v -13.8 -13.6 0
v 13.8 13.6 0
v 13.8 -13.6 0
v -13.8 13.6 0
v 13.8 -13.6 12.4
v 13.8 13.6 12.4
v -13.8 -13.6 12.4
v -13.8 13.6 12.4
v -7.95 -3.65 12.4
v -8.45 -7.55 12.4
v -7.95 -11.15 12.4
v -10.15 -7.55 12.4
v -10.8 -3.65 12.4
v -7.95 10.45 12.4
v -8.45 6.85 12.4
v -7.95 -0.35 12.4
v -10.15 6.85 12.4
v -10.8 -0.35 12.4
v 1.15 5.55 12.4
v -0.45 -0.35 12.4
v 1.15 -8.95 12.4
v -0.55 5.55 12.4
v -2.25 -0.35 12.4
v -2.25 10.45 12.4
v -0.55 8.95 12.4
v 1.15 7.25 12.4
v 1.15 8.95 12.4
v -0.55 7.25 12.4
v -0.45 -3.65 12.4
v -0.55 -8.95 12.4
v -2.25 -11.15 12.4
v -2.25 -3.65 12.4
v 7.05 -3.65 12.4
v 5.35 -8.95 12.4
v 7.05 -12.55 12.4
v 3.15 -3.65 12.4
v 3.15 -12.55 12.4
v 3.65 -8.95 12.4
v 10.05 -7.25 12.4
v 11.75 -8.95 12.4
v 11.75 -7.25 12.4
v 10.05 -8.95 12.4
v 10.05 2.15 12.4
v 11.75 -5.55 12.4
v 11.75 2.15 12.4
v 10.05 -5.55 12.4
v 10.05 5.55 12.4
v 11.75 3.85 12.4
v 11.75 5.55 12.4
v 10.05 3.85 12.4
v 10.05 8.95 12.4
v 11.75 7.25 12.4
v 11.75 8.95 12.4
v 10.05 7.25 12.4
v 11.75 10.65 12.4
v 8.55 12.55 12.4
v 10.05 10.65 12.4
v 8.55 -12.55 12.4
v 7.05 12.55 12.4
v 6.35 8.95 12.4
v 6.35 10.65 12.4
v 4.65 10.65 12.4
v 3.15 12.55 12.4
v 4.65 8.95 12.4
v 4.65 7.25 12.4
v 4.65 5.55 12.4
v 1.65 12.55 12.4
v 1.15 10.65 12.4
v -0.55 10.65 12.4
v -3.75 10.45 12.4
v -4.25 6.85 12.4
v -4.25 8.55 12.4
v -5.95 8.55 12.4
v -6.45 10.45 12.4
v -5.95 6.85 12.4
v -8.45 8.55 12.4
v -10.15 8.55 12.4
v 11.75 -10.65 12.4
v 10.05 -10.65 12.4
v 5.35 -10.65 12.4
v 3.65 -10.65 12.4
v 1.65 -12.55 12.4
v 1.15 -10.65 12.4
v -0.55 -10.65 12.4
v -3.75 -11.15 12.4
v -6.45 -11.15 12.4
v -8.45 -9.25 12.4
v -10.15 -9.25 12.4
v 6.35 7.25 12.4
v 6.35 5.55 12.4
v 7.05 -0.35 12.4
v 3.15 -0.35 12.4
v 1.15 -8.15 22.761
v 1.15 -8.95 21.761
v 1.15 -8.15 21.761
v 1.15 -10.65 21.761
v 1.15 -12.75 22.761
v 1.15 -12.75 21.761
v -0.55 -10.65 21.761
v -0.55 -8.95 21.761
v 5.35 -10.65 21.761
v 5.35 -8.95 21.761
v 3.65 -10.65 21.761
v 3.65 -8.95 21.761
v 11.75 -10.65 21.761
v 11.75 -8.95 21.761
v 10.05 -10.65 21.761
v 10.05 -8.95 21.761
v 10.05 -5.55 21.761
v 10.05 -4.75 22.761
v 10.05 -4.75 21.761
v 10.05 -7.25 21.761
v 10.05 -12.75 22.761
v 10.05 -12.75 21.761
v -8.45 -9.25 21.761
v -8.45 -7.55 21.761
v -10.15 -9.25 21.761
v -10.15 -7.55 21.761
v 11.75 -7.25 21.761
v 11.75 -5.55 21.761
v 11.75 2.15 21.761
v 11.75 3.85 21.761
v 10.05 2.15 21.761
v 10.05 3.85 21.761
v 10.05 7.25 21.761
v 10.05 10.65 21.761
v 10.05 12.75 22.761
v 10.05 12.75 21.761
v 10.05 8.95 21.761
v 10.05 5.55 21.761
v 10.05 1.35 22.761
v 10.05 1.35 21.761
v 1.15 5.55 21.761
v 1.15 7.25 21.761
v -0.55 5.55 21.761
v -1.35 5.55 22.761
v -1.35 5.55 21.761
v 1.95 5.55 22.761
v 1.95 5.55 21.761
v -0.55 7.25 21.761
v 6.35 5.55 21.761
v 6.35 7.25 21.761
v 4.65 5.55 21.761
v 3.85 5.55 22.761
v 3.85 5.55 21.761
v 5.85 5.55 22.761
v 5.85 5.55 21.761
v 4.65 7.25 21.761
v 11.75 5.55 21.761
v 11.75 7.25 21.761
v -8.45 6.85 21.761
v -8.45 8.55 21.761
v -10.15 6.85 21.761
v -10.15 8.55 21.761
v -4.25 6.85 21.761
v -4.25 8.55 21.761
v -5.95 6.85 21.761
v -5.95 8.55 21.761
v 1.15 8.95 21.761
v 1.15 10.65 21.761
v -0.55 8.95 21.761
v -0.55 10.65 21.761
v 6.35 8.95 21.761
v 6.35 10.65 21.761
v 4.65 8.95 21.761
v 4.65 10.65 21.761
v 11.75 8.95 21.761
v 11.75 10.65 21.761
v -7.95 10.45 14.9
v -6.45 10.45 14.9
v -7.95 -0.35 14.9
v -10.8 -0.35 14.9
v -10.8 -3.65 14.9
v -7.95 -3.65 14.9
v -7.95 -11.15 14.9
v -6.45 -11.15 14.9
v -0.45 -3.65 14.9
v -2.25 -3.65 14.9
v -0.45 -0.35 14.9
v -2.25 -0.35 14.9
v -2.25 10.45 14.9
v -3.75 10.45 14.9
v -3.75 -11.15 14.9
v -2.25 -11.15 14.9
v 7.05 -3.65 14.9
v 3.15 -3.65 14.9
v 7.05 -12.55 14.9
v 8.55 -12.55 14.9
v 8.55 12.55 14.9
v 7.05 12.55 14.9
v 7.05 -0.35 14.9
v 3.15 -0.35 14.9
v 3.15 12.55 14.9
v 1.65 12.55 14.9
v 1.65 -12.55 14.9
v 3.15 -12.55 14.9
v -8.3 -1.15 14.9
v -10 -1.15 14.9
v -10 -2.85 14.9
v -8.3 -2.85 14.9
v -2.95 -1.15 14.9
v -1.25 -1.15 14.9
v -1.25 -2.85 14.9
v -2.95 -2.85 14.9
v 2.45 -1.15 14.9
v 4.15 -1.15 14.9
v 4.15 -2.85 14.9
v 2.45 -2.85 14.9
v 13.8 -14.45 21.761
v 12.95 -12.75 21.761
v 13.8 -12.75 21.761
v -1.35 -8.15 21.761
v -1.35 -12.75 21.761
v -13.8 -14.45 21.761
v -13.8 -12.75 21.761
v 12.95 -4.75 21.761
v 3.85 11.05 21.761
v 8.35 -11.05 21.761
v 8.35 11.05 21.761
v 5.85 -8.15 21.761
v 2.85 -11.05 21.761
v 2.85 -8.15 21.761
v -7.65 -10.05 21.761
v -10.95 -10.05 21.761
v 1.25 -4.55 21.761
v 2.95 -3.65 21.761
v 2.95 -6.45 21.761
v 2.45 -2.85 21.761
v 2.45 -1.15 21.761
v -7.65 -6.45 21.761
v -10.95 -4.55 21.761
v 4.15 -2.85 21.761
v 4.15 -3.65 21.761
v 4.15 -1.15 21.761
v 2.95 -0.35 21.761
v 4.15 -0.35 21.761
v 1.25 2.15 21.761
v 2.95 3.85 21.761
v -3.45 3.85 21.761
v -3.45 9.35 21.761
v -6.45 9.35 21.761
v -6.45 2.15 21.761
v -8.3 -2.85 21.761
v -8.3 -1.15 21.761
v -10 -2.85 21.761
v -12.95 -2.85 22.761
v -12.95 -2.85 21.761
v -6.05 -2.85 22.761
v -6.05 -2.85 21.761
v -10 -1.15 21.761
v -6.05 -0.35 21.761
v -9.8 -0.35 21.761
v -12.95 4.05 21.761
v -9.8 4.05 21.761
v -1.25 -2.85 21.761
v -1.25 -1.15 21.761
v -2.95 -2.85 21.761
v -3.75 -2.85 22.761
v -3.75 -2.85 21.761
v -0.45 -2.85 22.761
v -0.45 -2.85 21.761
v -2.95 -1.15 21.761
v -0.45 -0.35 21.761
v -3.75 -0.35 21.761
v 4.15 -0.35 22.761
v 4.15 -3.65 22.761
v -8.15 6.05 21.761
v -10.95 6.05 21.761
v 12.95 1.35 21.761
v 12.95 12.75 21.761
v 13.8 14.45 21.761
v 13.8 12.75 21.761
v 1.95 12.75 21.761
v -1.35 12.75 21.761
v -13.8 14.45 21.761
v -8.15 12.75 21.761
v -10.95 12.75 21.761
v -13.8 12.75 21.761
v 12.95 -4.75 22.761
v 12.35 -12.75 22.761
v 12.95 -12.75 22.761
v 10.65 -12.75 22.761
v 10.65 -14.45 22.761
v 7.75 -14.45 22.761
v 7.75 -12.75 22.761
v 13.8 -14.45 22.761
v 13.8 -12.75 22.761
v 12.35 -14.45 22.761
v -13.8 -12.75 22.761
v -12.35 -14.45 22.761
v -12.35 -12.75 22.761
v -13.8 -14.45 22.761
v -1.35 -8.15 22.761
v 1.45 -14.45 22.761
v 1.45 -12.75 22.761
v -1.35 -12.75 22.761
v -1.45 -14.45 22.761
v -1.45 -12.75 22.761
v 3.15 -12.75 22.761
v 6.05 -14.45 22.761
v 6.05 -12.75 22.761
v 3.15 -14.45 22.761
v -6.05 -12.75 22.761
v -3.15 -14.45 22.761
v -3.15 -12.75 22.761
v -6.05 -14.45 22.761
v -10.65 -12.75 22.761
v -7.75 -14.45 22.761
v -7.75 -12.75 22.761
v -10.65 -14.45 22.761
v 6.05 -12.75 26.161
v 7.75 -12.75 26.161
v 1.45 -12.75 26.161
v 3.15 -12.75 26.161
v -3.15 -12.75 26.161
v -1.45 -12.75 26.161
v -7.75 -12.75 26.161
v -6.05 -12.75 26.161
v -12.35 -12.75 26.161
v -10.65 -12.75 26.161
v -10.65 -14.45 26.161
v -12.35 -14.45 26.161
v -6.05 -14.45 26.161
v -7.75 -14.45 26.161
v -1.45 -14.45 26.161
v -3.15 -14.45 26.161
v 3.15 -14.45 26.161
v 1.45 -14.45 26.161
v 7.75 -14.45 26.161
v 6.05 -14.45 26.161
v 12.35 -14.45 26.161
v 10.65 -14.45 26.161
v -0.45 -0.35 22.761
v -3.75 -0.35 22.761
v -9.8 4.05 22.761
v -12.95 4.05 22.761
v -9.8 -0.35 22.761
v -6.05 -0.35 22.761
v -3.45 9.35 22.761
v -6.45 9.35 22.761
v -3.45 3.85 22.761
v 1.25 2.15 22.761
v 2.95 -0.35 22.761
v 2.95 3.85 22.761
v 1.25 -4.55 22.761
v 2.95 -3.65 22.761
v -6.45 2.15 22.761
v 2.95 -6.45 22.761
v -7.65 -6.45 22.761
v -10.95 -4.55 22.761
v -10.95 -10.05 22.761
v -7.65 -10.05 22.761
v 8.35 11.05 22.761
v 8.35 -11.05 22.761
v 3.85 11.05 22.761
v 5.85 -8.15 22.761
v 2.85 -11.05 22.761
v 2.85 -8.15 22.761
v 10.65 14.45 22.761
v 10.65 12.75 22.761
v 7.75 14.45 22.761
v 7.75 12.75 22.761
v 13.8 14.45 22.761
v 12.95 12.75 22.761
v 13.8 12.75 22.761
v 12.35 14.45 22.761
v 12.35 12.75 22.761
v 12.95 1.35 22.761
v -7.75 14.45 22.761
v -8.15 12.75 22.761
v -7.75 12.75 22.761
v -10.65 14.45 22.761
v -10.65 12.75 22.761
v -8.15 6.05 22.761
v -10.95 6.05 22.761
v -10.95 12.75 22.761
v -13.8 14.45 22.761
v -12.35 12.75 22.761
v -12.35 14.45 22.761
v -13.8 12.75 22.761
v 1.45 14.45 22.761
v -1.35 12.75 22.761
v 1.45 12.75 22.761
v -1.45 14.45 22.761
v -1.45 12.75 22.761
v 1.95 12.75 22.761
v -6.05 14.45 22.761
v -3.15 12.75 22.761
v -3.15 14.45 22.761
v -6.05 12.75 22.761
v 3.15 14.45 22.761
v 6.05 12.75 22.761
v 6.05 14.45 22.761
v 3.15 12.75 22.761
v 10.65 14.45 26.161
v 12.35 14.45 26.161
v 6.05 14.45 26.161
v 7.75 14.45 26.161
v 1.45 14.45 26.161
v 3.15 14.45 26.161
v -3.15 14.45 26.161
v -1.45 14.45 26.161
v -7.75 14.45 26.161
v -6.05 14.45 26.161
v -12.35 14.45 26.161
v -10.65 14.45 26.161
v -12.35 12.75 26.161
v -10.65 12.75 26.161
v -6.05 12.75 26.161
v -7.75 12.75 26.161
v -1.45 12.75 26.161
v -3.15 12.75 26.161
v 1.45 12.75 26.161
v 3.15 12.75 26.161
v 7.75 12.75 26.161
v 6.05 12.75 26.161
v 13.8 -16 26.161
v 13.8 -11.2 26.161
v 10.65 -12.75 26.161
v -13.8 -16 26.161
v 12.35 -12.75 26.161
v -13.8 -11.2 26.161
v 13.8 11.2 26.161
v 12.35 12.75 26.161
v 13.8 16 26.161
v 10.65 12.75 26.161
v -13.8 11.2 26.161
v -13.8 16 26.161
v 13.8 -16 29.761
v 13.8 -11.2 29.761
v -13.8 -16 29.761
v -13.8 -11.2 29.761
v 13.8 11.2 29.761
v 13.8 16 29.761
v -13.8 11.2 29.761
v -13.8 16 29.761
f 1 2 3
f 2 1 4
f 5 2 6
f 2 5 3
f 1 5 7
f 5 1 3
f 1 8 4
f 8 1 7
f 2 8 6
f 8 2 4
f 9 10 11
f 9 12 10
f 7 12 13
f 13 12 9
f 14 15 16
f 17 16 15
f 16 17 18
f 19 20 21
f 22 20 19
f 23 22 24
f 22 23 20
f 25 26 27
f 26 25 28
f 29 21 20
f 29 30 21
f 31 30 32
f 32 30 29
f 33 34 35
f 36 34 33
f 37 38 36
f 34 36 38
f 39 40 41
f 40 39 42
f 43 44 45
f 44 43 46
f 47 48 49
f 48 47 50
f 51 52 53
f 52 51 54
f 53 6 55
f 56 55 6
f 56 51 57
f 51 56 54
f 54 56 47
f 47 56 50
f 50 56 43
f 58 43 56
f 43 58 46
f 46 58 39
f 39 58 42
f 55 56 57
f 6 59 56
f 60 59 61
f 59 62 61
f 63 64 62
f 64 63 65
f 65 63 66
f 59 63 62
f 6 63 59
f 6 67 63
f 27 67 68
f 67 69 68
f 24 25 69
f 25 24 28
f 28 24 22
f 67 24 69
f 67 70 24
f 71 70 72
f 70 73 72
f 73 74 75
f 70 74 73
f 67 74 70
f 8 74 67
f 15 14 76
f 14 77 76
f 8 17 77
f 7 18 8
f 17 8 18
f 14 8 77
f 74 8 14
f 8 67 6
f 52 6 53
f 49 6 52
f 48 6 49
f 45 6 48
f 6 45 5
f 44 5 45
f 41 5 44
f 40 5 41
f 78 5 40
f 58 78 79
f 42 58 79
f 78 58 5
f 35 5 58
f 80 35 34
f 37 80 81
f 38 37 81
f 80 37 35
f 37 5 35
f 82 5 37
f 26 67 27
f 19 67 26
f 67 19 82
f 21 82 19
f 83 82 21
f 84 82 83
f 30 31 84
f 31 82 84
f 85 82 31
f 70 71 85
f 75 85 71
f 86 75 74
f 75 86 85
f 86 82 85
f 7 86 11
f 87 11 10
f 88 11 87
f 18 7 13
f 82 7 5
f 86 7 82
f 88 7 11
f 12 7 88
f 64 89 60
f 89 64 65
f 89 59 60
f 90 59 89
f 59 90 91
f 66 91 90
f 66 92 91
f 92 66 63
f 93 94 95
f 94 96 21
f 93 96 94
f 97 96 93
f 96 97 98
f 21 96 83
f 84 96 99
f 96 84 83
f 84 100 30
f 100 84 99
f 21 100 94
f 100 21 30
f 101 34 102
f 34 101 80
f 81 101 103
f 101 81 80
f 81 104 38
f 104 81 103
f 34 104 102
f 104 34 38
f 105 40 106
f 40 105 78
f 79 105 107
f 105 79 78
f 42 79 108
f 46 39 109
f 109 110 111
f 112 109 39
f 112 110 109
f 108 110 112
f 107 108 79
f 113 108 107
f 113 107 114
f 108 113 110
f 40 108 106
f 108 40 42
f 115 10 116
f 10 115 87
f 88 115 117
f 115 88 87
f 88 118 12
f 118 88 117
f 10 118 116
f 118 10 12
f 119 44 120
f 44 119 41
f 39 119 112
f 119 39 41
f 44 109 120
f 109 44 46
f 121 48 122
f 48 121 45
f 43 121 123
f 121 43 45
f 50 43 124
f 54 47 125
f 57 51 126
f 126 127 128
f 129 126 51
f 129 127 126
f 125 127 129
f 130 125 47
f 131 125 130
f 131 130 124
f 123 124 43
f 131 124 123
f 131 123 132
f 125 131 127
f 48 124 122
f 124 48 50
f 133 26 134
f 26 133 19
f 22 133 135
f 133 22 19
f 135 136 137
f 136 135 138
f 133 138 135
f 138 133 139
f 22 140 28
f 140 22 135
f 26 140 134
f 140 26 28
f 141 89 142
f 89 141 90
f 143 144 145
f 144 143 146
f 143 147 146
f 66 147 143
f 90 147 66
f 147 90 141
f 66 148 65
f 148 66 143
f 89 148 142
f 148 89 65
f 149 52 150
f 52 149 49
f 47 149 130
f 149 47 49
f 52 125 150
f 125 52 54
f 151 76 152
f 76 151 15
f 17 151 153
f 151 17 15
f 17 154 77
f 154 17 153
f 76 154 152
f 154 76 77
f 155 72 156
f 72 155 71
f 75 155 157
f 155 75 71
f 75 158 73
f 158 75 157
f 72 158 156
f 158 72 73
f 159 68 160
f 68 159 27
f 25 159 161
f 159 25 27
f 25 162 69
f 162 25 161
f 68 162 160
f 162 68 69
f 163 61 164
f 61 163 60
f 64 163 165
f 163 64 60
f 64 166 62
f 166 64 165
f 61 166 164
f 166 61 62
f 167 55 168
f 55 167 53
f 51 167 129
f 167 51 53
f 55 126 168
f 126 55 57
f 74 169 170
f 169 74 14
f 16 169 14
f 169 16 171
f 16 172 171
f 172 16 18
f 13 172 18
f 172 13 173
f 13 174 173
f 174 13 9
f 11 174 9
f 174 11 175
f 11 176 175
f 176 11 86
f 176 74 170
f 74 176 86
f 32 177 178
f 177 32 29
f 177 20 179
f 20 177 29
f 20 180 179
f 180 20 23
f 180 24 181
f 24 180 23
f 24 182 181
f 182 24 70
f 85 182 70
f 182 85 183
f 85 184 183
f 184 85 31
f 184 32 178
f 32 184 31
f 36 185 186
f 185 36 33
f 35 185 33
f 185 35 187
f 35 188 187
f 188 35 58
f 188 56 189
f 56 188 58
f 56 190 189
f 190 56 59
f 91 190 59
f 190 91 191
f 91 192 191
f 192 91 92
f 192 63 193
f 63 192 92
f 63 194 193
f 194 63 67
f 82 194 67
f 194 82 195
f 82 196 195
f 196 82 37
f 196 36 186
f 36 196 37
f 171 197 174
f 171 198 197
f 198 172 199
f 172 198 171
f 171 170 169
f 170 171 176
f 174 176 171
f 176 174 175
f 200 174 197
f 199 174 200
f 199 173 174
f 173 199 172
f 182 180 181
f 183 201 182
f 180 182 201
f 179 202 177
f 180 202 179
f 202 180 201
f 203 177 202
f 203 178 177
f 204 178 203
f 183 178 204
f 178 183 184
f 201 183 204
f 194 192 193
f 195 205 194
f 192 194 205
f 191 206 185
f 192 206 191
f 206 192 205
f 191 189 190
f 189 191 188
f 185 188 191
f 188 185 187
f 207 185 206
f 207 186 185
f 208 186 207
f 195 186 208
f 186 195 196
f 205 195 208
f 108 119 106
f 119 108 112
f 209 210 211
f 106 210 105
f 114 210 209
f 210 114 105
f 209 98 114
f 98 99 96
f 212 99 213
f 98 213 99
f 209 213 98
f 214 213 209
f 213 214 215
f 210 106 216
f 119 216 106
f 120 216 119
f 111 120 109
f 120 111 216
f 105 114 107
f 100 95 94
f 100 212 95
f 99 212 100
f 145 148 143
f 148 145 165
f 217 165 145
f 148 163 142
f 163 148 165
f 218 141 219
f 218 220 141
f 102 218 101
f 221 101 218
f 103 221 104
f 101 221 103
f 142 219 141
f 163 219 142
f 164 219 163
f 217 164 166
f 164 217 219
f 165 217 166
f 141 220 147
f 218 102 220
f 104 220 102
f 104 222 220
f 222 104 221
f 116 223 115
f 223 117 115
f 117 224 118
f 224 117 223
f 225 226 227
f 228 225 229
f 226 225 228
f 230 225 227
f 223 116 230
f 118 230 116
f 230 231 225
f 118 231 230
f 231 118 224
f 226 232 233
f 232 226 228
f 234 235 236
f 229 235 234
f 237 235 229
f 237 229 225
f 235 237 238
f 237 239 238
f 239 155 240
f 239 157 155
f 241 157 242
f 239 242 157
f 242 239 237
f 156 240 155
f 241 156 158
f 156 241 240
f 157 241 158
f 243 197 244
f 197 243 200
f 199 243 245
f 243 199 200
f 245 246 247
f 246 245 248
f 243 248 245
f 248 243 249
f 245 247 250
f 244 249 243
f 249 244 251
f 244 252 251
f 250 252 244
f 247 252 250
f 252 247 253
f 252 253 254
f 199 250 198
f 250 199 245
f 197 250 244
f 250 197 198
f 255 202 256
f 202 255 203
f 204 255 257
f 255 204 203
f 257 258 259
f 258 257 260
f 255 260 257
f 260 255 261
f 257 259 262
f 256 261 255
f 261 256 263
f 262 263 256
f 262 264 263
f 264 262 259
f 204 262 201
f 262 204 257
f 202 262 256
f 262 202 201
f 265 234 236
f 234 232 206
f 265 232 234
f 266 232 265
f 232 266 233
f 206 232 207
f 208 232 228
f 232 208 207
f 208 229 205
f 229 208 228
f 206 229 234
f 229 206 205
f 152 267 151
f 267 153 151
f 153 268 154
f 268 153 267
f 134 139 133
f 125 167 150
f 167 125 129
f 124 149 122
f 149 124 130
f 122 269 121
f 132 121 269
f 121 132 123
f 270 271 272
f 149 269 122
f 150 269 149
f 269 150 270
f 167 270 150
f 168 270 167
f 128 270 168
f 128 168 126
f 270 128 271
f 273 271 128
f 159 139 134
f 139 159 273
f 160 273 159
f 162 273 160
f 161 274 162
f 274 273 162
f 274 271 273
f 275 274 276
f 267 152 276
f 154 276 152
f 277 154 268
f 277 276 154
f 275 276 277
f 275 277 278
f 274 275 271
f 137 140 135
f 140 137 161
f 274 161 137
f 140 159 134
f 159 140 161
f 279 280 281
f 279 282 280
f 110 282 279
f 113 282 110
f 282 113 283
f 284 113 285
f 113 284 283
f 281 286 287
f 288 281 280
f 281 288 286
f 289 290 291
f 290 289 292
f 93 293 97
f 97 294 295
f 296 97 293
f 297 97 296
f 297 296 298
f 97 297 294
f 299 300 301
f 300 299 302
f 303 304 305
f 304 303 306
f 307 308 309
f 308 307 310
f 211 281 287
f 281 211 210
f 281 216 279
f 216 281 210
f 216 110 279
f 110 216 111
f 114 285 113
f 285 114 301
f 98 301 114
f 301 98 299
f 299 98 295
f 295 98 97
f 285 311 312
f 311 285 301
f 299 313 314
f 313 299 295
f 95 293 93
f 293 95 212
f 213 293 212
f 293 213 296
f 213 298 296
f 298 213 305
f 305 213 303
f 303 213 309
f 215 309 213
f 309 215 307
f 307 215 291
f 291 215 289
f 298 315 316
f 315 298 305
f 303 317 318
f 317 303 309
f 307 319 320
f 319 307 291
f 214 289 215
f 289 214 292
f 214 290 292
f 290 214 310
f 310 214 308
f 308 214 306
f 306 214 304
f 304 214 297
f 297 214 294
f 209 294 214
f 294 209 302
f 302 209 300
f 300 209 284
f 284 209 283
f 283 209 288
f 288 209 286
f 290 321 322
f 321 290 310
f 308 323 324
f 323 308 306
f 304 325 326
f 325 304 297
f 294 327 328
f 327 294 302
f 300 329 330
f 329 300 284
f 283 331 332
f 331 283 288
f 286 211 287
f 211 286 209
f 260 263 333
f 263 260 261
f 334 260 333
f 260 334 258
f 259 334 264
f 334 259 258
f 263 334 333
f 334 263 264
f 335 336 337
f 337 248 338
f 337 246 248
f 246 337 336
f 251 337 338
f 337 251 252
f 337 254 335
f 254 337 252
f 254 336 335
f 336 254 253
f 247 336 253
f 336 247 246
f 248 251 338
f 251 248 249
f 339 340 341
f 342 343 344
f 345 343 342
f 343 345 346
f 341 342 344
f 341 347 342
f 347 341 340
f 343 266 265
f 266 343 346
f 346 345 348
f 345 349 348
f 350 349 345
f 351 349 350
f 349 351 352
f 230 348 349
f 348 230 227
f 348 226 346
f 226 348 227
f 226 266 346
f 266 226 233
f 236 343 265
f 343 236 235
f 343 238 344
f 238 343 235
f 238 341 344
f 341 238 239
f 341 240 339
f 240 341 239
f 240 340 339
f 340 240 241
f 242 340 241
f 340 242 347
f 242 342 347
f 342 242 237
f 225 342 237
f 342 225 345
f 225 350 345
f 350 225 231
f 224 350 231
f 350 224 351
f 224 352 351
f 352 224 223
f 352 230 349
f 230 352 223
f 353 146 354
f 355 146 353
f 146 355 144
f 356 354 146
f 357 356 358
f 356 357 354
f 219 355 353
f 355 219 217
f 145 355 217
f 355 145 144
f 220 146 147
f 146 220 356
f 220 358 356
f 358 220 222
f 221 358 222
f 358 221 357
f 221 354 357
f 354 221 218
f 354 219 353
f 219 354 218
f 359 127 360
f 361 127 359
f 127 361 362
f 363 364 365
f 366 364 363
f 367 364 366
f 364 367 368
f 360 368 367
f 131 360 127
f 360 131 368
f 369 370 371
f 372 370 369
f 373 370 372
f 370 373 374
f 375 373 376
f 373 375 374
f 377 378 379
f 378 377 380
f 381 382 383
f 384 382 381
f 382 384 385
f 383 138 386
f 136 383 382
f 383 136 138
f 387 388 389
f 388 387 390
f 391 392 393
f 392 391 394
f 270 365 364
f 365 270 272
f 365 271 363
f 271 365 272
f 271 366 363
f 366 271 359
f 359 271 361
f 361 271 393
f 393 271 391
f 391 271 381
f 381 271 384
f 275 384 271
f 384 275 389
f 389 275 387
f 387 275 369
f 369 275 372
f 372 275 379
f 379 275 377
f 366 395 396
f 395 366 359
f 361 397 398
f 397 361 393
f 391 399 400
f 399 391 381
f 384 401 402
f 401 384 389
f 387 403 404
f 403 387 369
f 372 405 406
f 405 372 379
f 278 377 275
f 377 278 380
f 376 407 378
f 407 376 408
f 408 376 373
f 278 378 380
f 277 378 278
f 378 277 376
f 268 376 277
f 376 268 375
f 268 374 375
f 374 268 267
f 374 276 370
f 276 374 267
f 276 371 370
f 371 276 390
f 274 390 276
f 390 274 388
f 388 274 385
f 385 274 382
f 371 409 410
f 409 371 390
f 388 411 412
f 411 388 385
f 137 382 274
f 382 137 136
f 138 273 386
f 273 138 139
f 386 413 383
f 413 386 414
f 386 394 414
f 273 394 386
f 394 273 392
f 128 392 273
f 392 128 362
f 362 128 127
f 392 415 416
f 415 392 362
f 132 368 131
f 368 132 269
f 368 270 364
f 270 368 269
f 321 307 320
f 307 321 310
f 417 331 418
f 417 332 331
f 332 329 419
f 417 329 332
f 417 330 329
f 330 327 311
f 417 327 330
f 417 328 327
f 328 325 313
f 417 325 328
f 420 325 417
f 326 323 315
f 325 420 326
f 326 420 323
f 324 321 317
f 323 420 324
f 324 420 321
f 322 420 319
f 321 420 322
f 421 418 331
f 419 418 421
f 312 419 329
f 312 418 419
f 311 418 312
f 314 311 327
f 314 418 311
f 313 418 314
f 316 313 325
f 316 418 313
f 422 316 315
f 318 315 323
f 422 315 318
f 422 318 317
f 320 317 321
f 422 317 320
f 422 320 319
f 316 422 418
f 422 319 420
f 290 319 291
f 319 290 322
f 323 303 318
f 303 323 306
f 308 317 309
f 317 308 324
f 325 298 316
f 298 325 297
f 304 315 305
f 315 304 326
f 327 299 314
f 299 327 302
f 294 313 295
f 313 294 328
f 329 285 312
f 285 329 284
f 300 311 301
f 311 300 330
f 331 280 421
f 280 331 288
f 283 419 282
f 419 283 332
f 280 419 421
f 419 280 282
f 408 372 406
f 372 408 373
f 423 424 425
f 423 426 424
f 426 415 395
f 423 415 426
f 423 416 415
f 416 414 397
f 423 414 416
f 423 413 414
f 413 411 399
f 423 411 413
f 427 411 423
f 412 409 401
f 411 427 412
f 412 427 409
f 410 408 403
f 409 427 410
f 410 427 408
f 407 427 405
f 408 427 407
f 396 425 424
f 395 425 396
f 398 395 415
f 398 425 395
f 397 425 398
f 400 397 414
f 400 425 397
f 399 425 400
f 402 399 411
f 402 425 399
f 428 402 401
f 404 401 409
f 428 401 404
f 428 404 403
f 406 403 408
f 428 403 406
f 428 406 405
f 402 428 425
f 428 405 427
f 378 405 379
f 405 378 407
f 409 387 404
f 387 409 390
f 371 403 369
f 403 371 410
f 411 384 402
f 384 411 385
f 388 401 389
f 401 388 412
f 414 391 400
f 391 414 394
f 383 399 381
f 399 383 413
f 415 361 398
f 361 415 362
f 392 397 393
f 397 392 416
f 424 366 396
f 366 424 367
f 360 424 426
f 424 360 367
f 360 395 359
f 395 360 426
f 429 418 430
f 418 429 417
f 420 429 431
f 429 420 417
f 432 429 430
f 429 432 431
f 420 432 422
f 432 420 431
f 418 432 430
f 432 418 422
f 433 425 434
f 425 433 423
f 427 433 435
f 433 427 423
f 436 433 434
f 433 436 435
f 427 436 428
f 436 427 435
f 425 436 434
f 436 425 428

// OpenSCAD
// Generated by SolidPython 0.4.2 on 2020-09-29 23:20:05
//!OpenSCAD

scale(v = 0.0100000000) {
	translate(v = [-1380, -1360, 0]) {
		union() {
			color(c = [0.4000000000, 0.4000000000, 0.4000000000]) {
				translate(v = [0, 0, 0]) {
					linear_extrude(height = 1000.0000000000) {
						polygon(paths = [[0, 1, 2, 3]], points = [[0, 0], [0, 2720], [2760, 2720], [2760, 0]]);
					}
				}
			}
			color(c = [0.2000000000, 0.6000000000, 0.2000000000]) {
				translate(v = [0, 0, 1000.0000000000]) {
					linear_extrude(height = 120.0000000000) {
						polygon(paths = [[0, 1, 2, 3]], points = [[0, 1305], [0, 2720], [2760, 2720], [2760, 1305]]);
					}
				}
			}
			color(c = [0.4000000000, 0.4000000000, 0.4000000000]) {
				translate(v = [0, 0, 1000.0000000000]) {
					linear_extrude(height = 120.0000000000) {
						polygon(paths = [[0, 1, 2, 3]], points = [[0, 0], [0, 1305], [2760, 1305], [2760, 0]]);
					}
				}
			}
			color(c = [0.9000000000, 0.6000000000, 0.6000000000]) {
				translate(v = [0, 0, 1120.0000000000]) {
					linear_extrude(height = 120.0000000000) {
						polygon(paths = [[0, 1, 2, 3]], points = [[305, 1855], [305, 2275], [585, 2275], [585, 1855]]);
					}
				}
			}
			color(c = [0.9000000000, 0.6000000000, 0.6000000000]) {
				translate(v = [0, 0, 1120.0000000000]) {
					linear_extrude(height = 120.0000000000) {
						polygon(paths = [[0, 1, 2, 3]], points = [[735, 1855], [735, 2275], [1005, 2275], [1005, 1855]]);
					}
				}
			}
			color(c = [0.9000000000, 0.6000000000, 0.6000000000]) {
				translate(v = [0, 0, 1120.0000000000]) {
					linear_extrude(height = 120.0000000000) {
						polygon(paths = [[0, 1, 2, 3, 4, 5, 6, 7]], points = [[1235, 1485], [1235, 1855], [1155, 1855], [1155, 2275], [1285, 2275], [1285, 2485], [1545, 2485], [1545, 1485]]);
					}
				}
			}
			color(c = [0.9000000000, 0.6000000000, 0.6000000000]) {
				translate(v = [0, 0, 1120.0000000000]) {
					linear_extrude(height = 120.0000000000) {
						polygon(paths = [[0, 1, 2, 3]], points = [[1695, 1485], [1695, 2485], [2085, 2485], [2085, 1485]]);
					}
				}
			}
			color(c = [0.9000000000, 0.6000000000, 0.6000000000]) {
				translate(v = [0, 0, 1120.0000000000]) {
					linear_extrude(height = 120.0000000000) {
						polygon(paths = [[0, 1, 2, 3]], points = [[2235, 1485], [2235, 2485], [2615, 2485], [2615, 1485]]);
					}
				}
			}
			color(c = [0.9000000000, 0.6000000000, 0.9000000000]) {
				translate(v = [0, 0, 1120.0000000000]) {
					linear_extrude(height = 120.0000000000) {
						polygon(paths = [[0, 1, 2, 3]], points = [[305, 375], [305, 795], [585, 795], [585, 375]]);
					}
				}
			}
			color(c = [0.9000000000, 0.6000000000, 0.9000000000]) {
				translate(v = [0, 0, 1120.0000000000]) {
					linear_extrude(height = 120.0000000000) {
						polygon(paths = [[0, 1, 2, 3]], points = [[735, 375], [735, 795], [1005, 795], [1005, 375]]);
					}
				}
			}
			color(c = [0.9000000000, 0.6000000000, 0.9000000000]) {
				translate(v = [0, 0, 1120.0000000000]) {
					linear_extrude(height = 120.0000000000) {
						polygon(paths = [[0, 1, 2, 3, 4, 5, 6, 7]], points = [[1285, 235], [1285, 375], [1155, 375], [1155, 795], [1285, 795], [1285, 885], [1545, 885], [1545, 235]]);
					}
				}
			}
			color(c = [0.9000000000, 0.6000000000, 0.9000000000]) {
				translate(v = [0, 0, 1120.0000000000]) {
					linear_extrude(height = 120.0000000000) {
						polygon(paths = [[0, 1, 2, 3]], points = [[1695, 235], [1695, 885], [2085, 885], [2085, 235]]);
					}
				}
			}
			color(c = [0.9000000000, 0.6000000000, 0.9000000000]) {
				translate(v = [0, 0, 1120.0000000000]) {
					linear_extrude(height = 120.0000000000) {
						polygon(paths = [[0, 1, 2, 3]], points = [[2235, 235], [2235, 885], [2615, 885], [2615, 235]]);
					}
				}
			}
			color(c = [0.2000000000, 0.6000000000, 0.2000000000]) {
				translate(v = [0, 0, 1120.0000000000]) {
					linear_extrude(height = 120.0000000000) {
						difference() {
							polygon(paths = [[0, 1, 2, 3]], points = [[0, 1305], [0, 2720], [2760, 2720], [2760, 1305]]);
							polygon(paths = [[0, 1, 2, 3]], points = [[1695, 1485], [2085, 1485], [2085, 2485], [1695, 2485]]);
							polygon(paths = [[0, 1, 2, 3]], points = [[2235, 1485], [2615, 1485], [2615, 2485], [2235, 2485]]);
							polygon(paths = [[0, 1, 2, 3]], points = [[305, 1855], [585, 1855], [585, 2275], [305, 2275]]);
							polygon(paths = [[0, 1, 2, 3]], points = [[735, 1855], [1005, 1855], [1005, 2275], [735, 2275]]);
							polygon(paths = [[0, 1, 2, 3, 4, 5, 6, 7]], points = [[1235, 1485], [1545, 1485], [1545, 2485], [1285, 2485], [1285, 2275], [1155, 2275], [1155, 1855], [1235, 1855]]);
						}
					}
				}
			}
			color(c = [0.4000000000, 0.4000000000, 0.4000000000]) {
				translate(v = [0, 0, 1120.0000000000]) {
					linear_extrude(height = 120.0000000000) {
						difference() {
							polygon(paths = [[0, 1, 2, 3]], points = [[0, 0], [0, 1305], [2760, 1305], [2760, 0]]);
							polygon(paths = [[0, 1, 2, 3]], points = [[1695, 235], [2085, 235], [2085, 885], [1695, 885]]);
							polygon(paths = [[0, 1, 2, 3]], points = [[2235, 235], [2615, 235], [2615, 885], [2235, 885]]);
							polygon(paths = [[0, 1, 2, 3]], points = [[305, 375], [585, 375], [585, 795], [305, 795]]);
							polygon(paths = [[0, 1, 2, 3]], points = [[735, 375], [1005, 375], [1005, 795], [735, 795]]);
							polygon(paths = [[0, 1, 2, 3, 4, 5, 6, 7]], points = [[1285, 235], [1545, 235], [1545, 885], [1285, 885], [1285, 795], [1155, 795], [1155, 375], [1285, 375]]);
						}
					}
				}
			}
			color(c = [0.1000000000, 0.1000000000, 0.1000000000]) {
				translate(v = [0, 0, 1240.0000000000]) {
					linear_extrude(height = 70.0000000000) {
						polygon(paths = [[0, 1, 2, 3]], points = [[1325, 295], [1325, 465], [1495, 465], [1495, 295]]);
					}
				}
			}
			color(c = [0.1000000000, 0.1000000000, 0.1000000000]) {
				translate(v = [0, 0, 1240.0000000000]) {
					linear_extrude(height = 70.0000000000) {
						polygon(paths = [[0, 1, 2, 3]], points = [[1745, 295], [1745, 465], [1915, 465], [1915, 295]]);
					}
				}
			}
			color(c = [0.1000000000, 0.1000000000, 0.1000000000]) {
				translate(v = [0, 0, 1240.0000000000]) {
					linear_extrude(height = 70.0000000000) {
						polygon(paths = [[0, 1, 2, 3]], points = [[2385, 295], [2385, 465], [2555, 465], [2555, 295]]);
					}
				}
			}
			color(c = [0.1000000000, 0.1000000000, 0.1000000000]) {
				translate(v = [0, 0, 1240.0000000000]) {
					linear_extrude(height = 70.0000000000) {
						polygon(paths = [[0, 1, 2, 3]], points = [[365, 435], [365, 605], [535, 605], [535, 435]]);
					}
				}
			}
			color(c = [0.1000000000, 0.1000000000, 0.1000000000]) {
				translate(v = [0, 0, 1240.0000000000]) {
					linear_extrude(height = 70.0000000000) {
						polygon(paths = [[0, 1, 2, 3]], points = [[2385, 635], [2385, 805], [2555, 805], [2555, 635]]);
					}
				}
			}
			color(c = [0.1000000000, 0.1000000000, 0.1000000000]) {
				translate(v = [0, 0, 1240.0000000000]) {
					linear_extrude(height = 70.0000000000) {
						polygon(paths = [[0, 1, 2, 3]], points = [[2385, 1575], [2385, 1745], [2555, 1745], [2555, 1575]]);
					}
				}
			}
			color(c = [0.1000000000, 0.1000000000, 0.1000000000]) {
				translate(v = [0, 0, 1240.0000000000]) {
					linear_extrude(height = 70.0000000000) {
						polygon(paths = [[0, 1, 2, 3]], points = [[1325, 1915], [1325, 2085], [1495, 2085], [1495, 1915]]);
					}
				}
			}
			color(c = [0.1000000000, 0.1000000000, 0.1000000000]) {
				translate(v = [0, 0, 1240.0000000000]) {
					linear_extrude(height = 70.0000000000) {
						polygon(paths = [[0, 1, 2, 3]], points = [[1845, 1915], [1845, 2085], [2015, 2085], [2015, 1915]]);
					}
				}
			}
			color(c = [0.1000000000, 0.1000000000, 0.1000000000]) {
				translate(v = [0, 0, 1240.0000000000]) {
					linear_extrude(height = 70.0000000000) {
						polygon(paths = [[0, 1, 2, 3]], points = [[2385, 1915], [2385, 2085], [2555, 2085], [2555, 1915]]);
					}
				}
			}
			color(c = [0.1000000000, 0.1000000000, 0.1000000000]) {
				translate(v = [0, 0, 1240.0000000000]) {
					linear_extrude(height = 70.0000000000) {
						polygon(paths = [[0, 1, 2, 3]], points = [[365, 2045], [365, 2215], [535, 2215], [535, 2045]]);
					}
				}
			}
			color(c = [0.1000000000, 0.1000000000, 0.1000000000]) {
				translate(v = [0, 0, 1240.0000000000]) {
					linear_extrude(height = 70.0000000000) {
						polygon(paths = [[0, 1, 2, 3]], points = [[785, 2045], [785, 2215], [955, 2215], [955, 2045]]);
					}
				}
			}
			color(c = [0.1000000000, 0.1000000000, 0.1000000000]) {
				translate(v = [0, 0, 1240.0000000000]) {
					linear_extrude(height = 70.0000000000) {
						polygon(paths = [[0, 1, 2, 3]], points = [[1325, 2255], [1325, 2425], [1495, 2425], [1495, 2255]]);
					}
				}
			}
			color(c = [0.1000000000, 0.1000000000, 0.1000000000]) {
				translate(v = [0, 0, 1240.0000000000]) {
					linear_extrude(height = 70.0000000000) {
						polygon(paths = [[0, 1, 2, 3]], points = [[1845, 2255], [1845, 2425], [2015, 2425], [2015, 2255]]);
					}
				}
			}
			color(c = [0.1000000000, 0.1000000000, 0.1000000000]) {
				translate(v = [0, 0, 1240.0000000000]) {
					linear_extrude(height = 70.0000000000) {
						polygon(paths = [[0, 1, 2, 3]], points = [[2385, 2255], [2385, 2425], [2555, 2425], [2555, 2255]]);
					}
				}
			}
			color(c = [1.0000000000, 1.0000000000, 1.0000000000]) {
				translate(v = [0, 0, 1240.0000000000]) {
					linear_extrude(height = 70.0000000000) {
						polygon(paths = [[0, 1, 2, 3, 4, 5, 6, 7]], points = [[585, 245], [585, 995], [300, 995], [300, 1325], [585, 1325], [585, 2405], [735, 2405], [735, 245]]);
					}
				}
			}
			color(c = [1.0000000000, 1.0000000000, 1.0000000000]) {
				translate(v = [0, 0, 1240.0000000000]) {
					linear_extrude(height = 70.0000000000) {
						polygon(paths = [[0, 1, 2, 3, 4, 5, 6, 7]], points = [[1005, 245], [1005, 2405], [1155, 2405], [1155, 1325], [1335, 1325], [1335, 995], [1155, 995], [1155, 245]]);
					}
				}
			}
			color(c = [1.0000000000, 1.0000000000, 1.0000000000]) {
				translate(v = [0, 0, 1240.0000000000]) {
					linear_extrude(height = 70.0000000000) {
						polygon(paths = [[0, 1, 2, 3, 4, 5, 6, 7, 8, 9, 10, 11]], points = [[1545, 105], [1545, 2615], [1695, 2615], [1695, 1325], [2085, 1325], [2085, 2615], [2235, 2615], [2235, 105], [2085, 105], [2085, 995], [1695, 995], [1695, 105]]);
					}
				}
			}
			color(c = [0.1000000000, 0.1000000000, 0.1000000000]) {
				translate(v = [0, 0, 1310.0000000000]) {
					linear_extrude(height = 180.0000000000) {
						polygon(paths = [[0, 1, 2, 3]], points = [[1325, 295], [1325, 465], [1495, 465], [1495, 295]]);
					}
				}
			}
			color(c = [0.1000000000, 0.1000000000, 0.1000000000]) {
				translate(v = [0, 0, 1310.0000000000]) {
					linear_extrude(height = 180.0000000000) {
						polygon(paths = [[0, 1, 2, 3]], points = [[1745, 295], [1745, 465], [1915, 465], [1915, 295]]);
					}
				}
			}
			color(c = [0.1000000000, 0.1000000000, 0.1000000000]) {
				translate(v = [0, 0, 1310.0000000000]) {
					linear_extrude(height = 180.0000000000) {
						polygon(paths = [[0, 1, 2, 3]], points = [[2385, 295], [2385, 465], [2555, 465], [2555, 295]]);
					}
				}
			}
			color(c = [0.1000000000, 0.1000000000, 0.1000000000]) {
				translate(v = [0, 0, 1310.0000000000]) {
					linear_extrude(height = 180.0000000000) {
						polygon(paths = [[0, 1, 2, 3]], points = [[365, 435], [365, 605], [535, 605], [535, 435]]);
					}
				}
			}
			color(c = [0.1000000000, 0.1000000000, 0.1000000000]) {
				translate(v = [0, 0, 1310.0000000000]) {
					linear_extrude(height = 180.0000000000) {
						polygon(paths = [[0, 1, 2, 3]], points = [[2385, 635], [2385, 805], [2555, 805], [2555, 635]]);
					}
				}
			}
			color(c = [0.1000000000, 0.1000000000, 0.1000000000]) {
				translate(v = [0, 0, 1310.0000000000]) {
					linear_extrude(height = 180.0000000000) {
						polygon(paths = [[0, 1, 2, 3]], points = [[2385, 1575], [2385, 1745], [2555, 1745], [2555, 1575]]);
					}
				}
			}
			color(c = [0.1000000000, 0.1000000000, 0.1000000000]) {
				translate(v = [0, 0, 1310.0000000000]) {
					linear_extrude(height = 180.0000000000) {
						polygon(paths = [[0, 1, 2, 3]], points = [[1325, 1915], [1325, 2085], [1495, 2085], [1495, 1915]]);
					}
				}
			}
			color(c = [0.1000000000, 0.1000000000, 0.1000000000]) {
				translate(v = [0, 0, 1310.0000000000]) {
					linear_extrude(height = 180.0000000000) {
						polygon(paths = [[0, 1, 2, 3]], points = [[1845, 1915], [1845, 2085], [2015, 2085], [2015, 1915]]);
					}
				}
			}
			color(c = [0.1000000000, 0.1000000000, 0.1000000000]) {
				translate(v = [0, 0, 1310.0000000000]) {
					linear_extrude(height = 180.0000000000) {
						polygon(paths = [[0, 1, 2, 3]], points = [[2385, 1915], [2385, 2085], [2555, 2085], [2555, 1915]]);
					}
				}
			}
			color(c = [0.1000000000, 0.1000000000, 0.1000000000]) {
				translate(v = [0, 0, 1310.0000000000]) {
					linear_extrude(height = 180.0000000000) {
						polygon(paths = [[0, 1, 2, 3]], points = [[365, 2045], [365, 2215], [535, 2215], [535, 2045]]);
					}
				}
			}
			color(c = [0.1000000000, 0.1000000000, 0.1000000000]) {
				translate(v = [0, 0, 1310.0000000000]) {
					linear_extrude(height = 180.0000000000) {
						polygon(paths = [[0, 1, 2, 3]], points = [[785, 2045], [785, 2215], [955, 2215], [955, 2045]]);
					}
				}
			}
			color(c = [0.1000000000, 0.1000000000, 0.1000000000]) {
				translate(v = [0, 0, 1310.0000000000]) {
					linear_extrude(height = 180.0000000000) {
						polygon(paths = [[0, 1, 2, 3]], points = [[1325, 2255], [1325, 2425], [1495, 2425], [1495, 2255]]);
					}
				}
			}
			color(c = [0.1000000000, 0.1000000000, 0.1000000000]) {
				translate(v = [0, 0, 1310.0000000000]) {
					linear_extrude(height = 180.0000000000) {
						polygon(paths = [[0, 1, 2, 3]], points = [[1845, 2255], [1845, 2425], [2015, 2425], [2015, 2255]]);
					}
				}
			}
			color(c = [0.1000000000, 0.1000000000, 0.1000000000]) {
				translate(v = [0, 0, 1310.0000000000]) {
					linear_extrude(height = 180.0000000000) {
						polygon(paths = [[0, 1, 2, 3]], points = [[2385, 2255], [2385, 2425], [2555, 2425], [2555, 2255]]);
					}
				}
			}
			color(c = [0.7000000000, 0, 0]) {
				translate(v = [0, 0, 1310.0000000000]) {
					linear_extrude(height = 180.0000000000) {
						polygon(paths = [[0, 1, 2, 3, 4, 5, 6, 7]], points = [[585, 245], [585, 995], [300, 995], [300, 1325], [585, 1325], [585, 2405], [735, 2405], [735, 245]]);
					}
				}
			}
			color(c = [0.7000000000, 0, 0]) {
				translate(v = [0, 0, 1310.0000000000]) {
					linear_extrude(height = 180.0000000000) {
						polygon(paths = [[0, 1, 2, 3, 4, 5, 6, 7]], points = [[1005, 245], [1005, 2405], [1155, 2405], [1155, 1325], [1335, 1325], [1335, 995], [1155, 995], [1155, 245]]);
					}
				}
			}
			color(c = [0.7000000000, 0, 0]) {
				translate(v = [0, 0, 1310.0000000000]) {
					linear_extrude(height = 180.0000000000) {
						polygon(paths = [[0, 1, 2, 3, 4, 5, 6, 7, 8, 9, 10, 11]], points = [[1545, 105], [1545, 2615], [1695, 2615], [1695, 1325], [2085, 1325], [2085, 2615], [2235, 2615], [2235, 105], [2085, 105], [2085, 995], [1695, 995], [1695, 105]]);
					}
				}
			}
			color(c = [0.1000000000, 0.1000000000, 0.1000000000]) {
				translate(v = [0, 0, 1490.0000000000]) {
					linear_extrude(height = 686.1000000000) {
						polygon(paths = [[0, 1, 2, 3]], points = [[1325, 295], [1325, 465], [1495, 465], [1495, 295]]);
					}
				}
			}
			color(c = [0.1000000000, 0.1000000000, 0.1000000000]) {
				translate(v = [0, 0, 1490.0000000000]) {
					linear_extrude(height = 686.1000000000) {
						polygon(paths = [[0, 1, 2, 3]], points = [[1745, 295], [1745, 465], [1915, 465], [1915, 295]]);
					}
				}
			}
			color(c = [0.1000000000, 0.1000000000, 0.1000000000]) {
				translate(v = [0, 0, 1490.0000000000]) {
					linear_extrude(height = 686.1000000000) {
						polygon(paths = [[0, 1, 2, 3]], points = [[2385, 295], [2385, 465], [2555, 465], [2555, 295]]);
					}
				}
			}
			color(c = [0.1000000000, 0.1000000000, 0.1000000000]) {
				translate(v = [0, 0, 1490.0000000000]) {
					linear_extrude(height = 686.1000000000) {
						polygon(paths = [[0, 1, 2, 3]], points = [[365, 435], [365, 605], [535, 605], [535, 435]]);
					}
				}
			}
			color(c = [0.1000000000, 0.1000000000, 0.1000000000]) {
				translate(v = [0, 0, 1490.0000000000]) {
					linear_extrude(height = 686.1000000000) {
						polygon(paths = [[0, 1, 2, 3]], points = [[2385, 635], [2385, 805], [2555, 805], [2555, 635]]);
					}
				}
			}
			color(c = [0.1000000000, 0.1000000000, 0.1000000000]) {
				translate(v = [0, 0, 1490.0000000000]) {
					linear_extrude(height = 686.1000000000) {
						polygon(paths = [[0, 1, 2, 3]], points = [[380, 1075], [380, 1245], [550, 1245], [550, 1075]]);
					}
				}
			}
			color(c = [0.1000000000, 0.1000000000, 0.1000000000]) {
				translate(v = [0, 0, 1490.0000000000]) {
					linear_extrude(height = 686.1000000000) {
						polygon(paths = [[0, 1, 2, 3]], points = [[1085, 1075], [1085, 1245], [1255, 1245], [1255, 1075]]);
					}
				}
			}
			color(c = [0.1000000000, 0.1000000000, 0.1000000000]) {
				translate(v = [0, 0, 1490.0000000000]) {
					linear_extrude(height = 686.1000000000) {
						polygon(paths = [[0, 1, 2, 3]], points = [[1625, 1075], [1625, 1245], [1795, 1245], [1795, 1075]]);
					}
				}
			}
			color(c = [0.1000000000, 0.1000000000, 0.1000000000]) {
				translate(v = [0, 0, 1490.0000000000]) {
					linear_extrude(height = 686.1000000000) {
						polygon(paths = [[0, 1, 2, 3]], points = [[2385, 1575], [2385, 1745], [2555, 1745], [2555, 1575]]);
					}
				}
			}
			color(c = [0.1000000000, 0.1000000000, 0.1000000000]) {
				translate(v = [0, 0, 1490.0000000000]) {
					linear_extrude(height = 686.1000000000) {
						polygon(paths = [[0, 1, 2, 3]], points = [[1325, 1915], [1325, 2085], [1495, 2085], [1495, 1915]]);
					}
				}
			}
			color(c = [0.1000000000, 0.1000000000, 0.1000000000]) {
				translate(v = [0, 0, 1490.0000000000]) {
					linear_extrude(height = 686.1000000000) {
						polygon(paths = [[0, 1, 2, 3]], points = [[1845, 1915], [1845, 2085], [2015, 2085], [2015, 1915]]);
					}
				}
			}
			color(c = [0.1000000000, 0.1000000000, 0.1000000000]) {
				translate(v = [0, 0, 1490.0000000000]) {
					linear_extrude(height = 686.1000000000) {
						polygon(paths = [[0, 1, 2, 3]], points = [[2385, 1915], [2385, 2085], [2555, 2085], [2555, 1915]]);
					}
				}
			}
			color(c = [0.1000000000, 0.1000000000, 0.1000000000]) {
				translate(v = [0, 0, 1490.0000000000]) {
					linear_extrude(height = 686.1000000000) {
						polygon(paths = [[0, 1, 2, 3]], points = [[365, 2045], [365, 2215], [535, 2215], [535, 2045]]);
					}
				}
			}
			color(c = [0.1000000000, 0.1000000000, 0.1000000000]) {
				translate(v = [0, 0, 1490.0000000000]) {
					linear_extrude(height = 686.1000000000) {
						polygon(paths = [[0, 1, 2, 3]], points = [[785, 2045], [785, 2215], [955, 2215], [955, 2045]]);
					}
				}
			}
			color(c = [0.1000000000, 0.1000000000, 0.1000000000]) {
				translate(v = [0, 0, 1490.0000000000]) {
					linear_extrude(height = 686.1000000000) {
						polygon(paths = [[0, 1, 2, 3]], points = [[1325, 2255], [1325, 2425], [1495, 2425], [1495, 2255]]);
					}
				}
			}
			color(c = [0.1000000000, 0.1000000000, 0.1000000000]) {
				translate(v = [0, 0, 1490.0000000000]) {
					linear_extrude(height = 686.1000000000) {
						polygon(paths = [[0, 1, 2, 3]], points = [[1845, 2255], [1845, 2425], [2015, 2425], [2015, 2255]]);
					}
				}
			}
			color(c = [0.1000000000, 0.1000000000, 0.1000000000]) {
				translate(v = [0, 0, 1490.0000000000]) {
					linear_extrude(height = 686.1000000000) {
						polygon(paths = [[0, 1, 2, 3]], points = [[2385, 2255], [2385, 2425], [2555, 2425], [2555, 2255]]);
					}
				}
			}
			color(c = [0.9000000000, 0.6000000000, 0.6000000000]) {
				translate(v = [0, 0, 2176.1000000000]) {
					linear_extrude(height = 100.0000000000) {
						polygon(paths = [[0, 1, 2, 3, 4, 5, 6, 7, 8, 9, 10, 11]], points = [[0, -85], [0, 85], [1245, 85], [1245, 545], [1495, 545], [1495, 85], [2385, 85], [2385, 885], [2675, 885], [2675, 85], [2760, 85], [2760, -85]]);
					}
				}
			}
			color(c = [0.9000000000, 0.6000000000, 0.6000000000]) {
				translate(v = [0, 0, 2176.1000000000]) {
					linear_extrude(height = 100.0000000000) {
						polygon(paths = [[0, 1, 2, 3]], points = [[1005, 1075], [1005, 1325], [1335, 1325], [1335, 1075]]);
					}
				}
			}
			color(c = [0.9000000000, 0.6000000000, 0.6000000000]) {
				translate(v = [0, 0, 2176.1000000000]) {
					linear_extrude(height = 100.0000000000) {
						polygon(paths = [[0, 1, 2, 3, 4, 5]], points = [[85, 1075], [85, 1765], [400, 1765], [400, 1325], [775, 1325], [775, 1075]]);
					}
				}
			}
			color(c = [0.9000000000, 0.6000000000, 0.6000000000]) {
				translate(v = [0, 0, 2176.1000000000]) {
					linear_extrude(height = 100.0000000000) {
						polygon(paths = [[0, 1, 2, 3, 4, 5, 6, 7, 8, 9, 10, 11, 12, 13, 14, 15]], points = [[285, 355], [285, 905], [1505, 905], [1505, 1575], [735, 1575], [735, 2295], [1035, 2295], [1035, 1745], [1675, 1745], [1675, 1325], [1795, 1325], [1795, 995], [1675, 995], [1675, 715], [615, 715], [615, 355]]);
					}
				}
			}
			color(c = [0.9000000000, 0.6000000000, 0.6000000000]) {
				translate(v = [0, 0, 2176.1000000000]) {
					linear_extrude(height = 100.0000000000) {
						polygon(paths = [[0, 1, 2, 3, 4, 5, 6, 7]], points = [[1665, 255], [1665, 545], [1965, 545], [1965, 1915], [1765, 1915], [1765, 2465], [2215, 2465], [2215, 255]]);
					}
				}
			}
			color(c = [0.9000000000, 0.6000000000, 0.6000000000]) {
				translate(v = [0, 0, 2176.1000000000]) {
					linear_extrude(height = 100.0000000000) {
						polygon(paths = [[0, 1, 2, 3, 4, 5, 6, 7, 8, 9, 10, 11, 12, 13, 14, 15]], points = [[2385, 1495], [2385, 2635], [1575, 2635], [1575, 1915], [1245, 1915], [1245, 2635], [565, 2635], [565, 1965], [285, 1965], [285, 2635], [0, 2635], [0, 2805], [2760, 2805], [2760, 2635], [2675, 2635], [2675, 1495]]);
					}
				}
			}
			color(c = [0.5000000000, 0.5000000000, 0.5000000000]) {
				translate(v = [0, 0, 2276.1000000000]) {
					linear_extrude(height = 340.0000000000) {
						polygon(paths = [[0, 1, 2, 3]], points = [[145, -85], [145, 85], [315, 85], [315, -85]]);
					}
				}
			}
			color(c = [0.5000000000, 0.5000000000, 0.5000000000]) {
				translate(v = [0, 0, 2276.1000000000]) {
					linear_extrude(height = 340.0000000000) {
						polygon(paths = [[0, 1, 2, 3]], points = [[605, -85], [605, 85], [775, 85], [775, -85]]);
					}
				}
			}
			color(c = [0.5000000000, 0.5000000000, 0.5000000000]) {
				translate(v = [0, 0, 2276.1000000000]) {
					linear_extrude(height = 340.0000000000) {
						polygon(paths = [[0, 1, 2, 3]], points = [[1065, -85], [1065, 85], [1235, 85], [1235, -85]]);
					}
				}
			}
			color(c = [0.5000000000, 0.5000000000, 0.5000000000]) {
				translate(v = [0, 0, 2276.1000000000]) {
					linear_extrude(height = 340.0000000000) {
						polygon(paths = [[0, 1, 2, 3]], points = [[1525, -85], [1525, 85], [1695, 85], [1695, -85]]);
					}
				}
			}
			color(c = [0.5000000000, 0.5000000000, 0.5000000000]) {
				translate(v = [0, 0, 2276.1000000000]) {
					linear_extrude(height = 340.0000000000) {
						polygon(paths = [[0, 1, 2, 3]], points = [[1985, -85], [1985, 85], [2155, 85], [2155, -85]]);
					}
				}
			}
			color(c = [0.5000000000, 0.5000000000, 0.5000000000]) {
				translate(v = [0, 0, 2276.1000000000]) {
					linear_extrude(height = 340.0000000000) {
						polygon(paths = [[0, 1, 2, 3]], points = [[2445, -85], [2445, 85], [2615, 85], [2615, -85]]);
					}
				}
			}
			color(c = [0.5000000000, 0.5000000000, 0.5000000000]) {
				translate(v = [0, 0, 2276.1000000000]) {
					linear_extrude(height = 340.0000000000) {
						polygon(paths = [[0, 1, 2, 3]], points = [[145, 2635], [145, 2805], [315, 2805], [315, 2635]]);
					}
				}
			}
			color(c = [0.5000000000, 0.5000000000, 0.5000000000]) {
				translate(v = [0, 0, 2276.1000000000]) {
					linear_extrude(height = 340.0000000000) {
						polygon(paths = [[0, 1, 2, 3]], points = [[605, 2635], [605, 2805], [775, 2805], [775, 2635]]);
					}
				}
			}
			color(c = [0.5000000000, 0.5000000000, 0.5000000000]) {
				translate(v = [0, 0, 2276.1000000000]) {
					linear_extrude(height = 340.0000000000) {
						polygon(paths = [[0, 1, 2, 3]], points = [[1065, 2635], [1065, 2805], [1235, 2805], [1235, 2635]]);
					}
				}
			}
			color(c = [0.5000000000, 0.5000000000, 0.5000000000]) {
				translate(v = [0, 0, 2276.1000000000]) {
					linear_extrude(height = 340.0000000000) {
						polygon(paths = [[0, 1, 2, 3]], points = [[1525, 2635], [1525, 2805], [1695, 2805], [1695, 2635]]);
					}
				}
			}
			color(c = [0.5000000000, 0.5000000000, 0.5000000000]) {
				translate(v = [0, 0, 2276.1000000000]) {
					linear_extrude(height = 340.0000000000) {
						polygon(paths = [[0, 1, 2, 3]], points = [[1985, 2635], [1985, 2805], [2155, 2805], [2155, 2635]]);
					}
				}
			}
			color(c = [0.5000000000, 0.5000000000, 0.5000000000]) {
				translate(v = [0, 0, 2276.1000000000]) {
					linear_extrude(height = 340.0000000000) {
						polygon(paths = [[0, 1, 2, 3]], points = [[2445, 2635], [2445, 2805], [2615, 2805], [2615, 2635]]);
					}
				}
			}
			color(c = [0.3000000000, 0.3000000000, 1]) {
				translate(v = [0, 0, 2616.1000000000]) {
					linear_extrude(height = 360.0000000000) {
						polygon(paths = [[0, 1, 2, 3]], points = [[0, -240], [0, 240], [2760, 240], [2760, -240]]);
					}
				}
			}
			color(c = [0.3000000000, 0.3000000000, 1]) {
				translate(v = [0, 0, 2616.1000000000]) {
					linear_extrude(height = 360.0000000000) {
						polygon(paths = [[0, 1, 2, 3]], points = [[0, 2480], [0, 2960], [2760, 2960], [2760, 2480]]);
					}
				}
			}
		}
	}
}
